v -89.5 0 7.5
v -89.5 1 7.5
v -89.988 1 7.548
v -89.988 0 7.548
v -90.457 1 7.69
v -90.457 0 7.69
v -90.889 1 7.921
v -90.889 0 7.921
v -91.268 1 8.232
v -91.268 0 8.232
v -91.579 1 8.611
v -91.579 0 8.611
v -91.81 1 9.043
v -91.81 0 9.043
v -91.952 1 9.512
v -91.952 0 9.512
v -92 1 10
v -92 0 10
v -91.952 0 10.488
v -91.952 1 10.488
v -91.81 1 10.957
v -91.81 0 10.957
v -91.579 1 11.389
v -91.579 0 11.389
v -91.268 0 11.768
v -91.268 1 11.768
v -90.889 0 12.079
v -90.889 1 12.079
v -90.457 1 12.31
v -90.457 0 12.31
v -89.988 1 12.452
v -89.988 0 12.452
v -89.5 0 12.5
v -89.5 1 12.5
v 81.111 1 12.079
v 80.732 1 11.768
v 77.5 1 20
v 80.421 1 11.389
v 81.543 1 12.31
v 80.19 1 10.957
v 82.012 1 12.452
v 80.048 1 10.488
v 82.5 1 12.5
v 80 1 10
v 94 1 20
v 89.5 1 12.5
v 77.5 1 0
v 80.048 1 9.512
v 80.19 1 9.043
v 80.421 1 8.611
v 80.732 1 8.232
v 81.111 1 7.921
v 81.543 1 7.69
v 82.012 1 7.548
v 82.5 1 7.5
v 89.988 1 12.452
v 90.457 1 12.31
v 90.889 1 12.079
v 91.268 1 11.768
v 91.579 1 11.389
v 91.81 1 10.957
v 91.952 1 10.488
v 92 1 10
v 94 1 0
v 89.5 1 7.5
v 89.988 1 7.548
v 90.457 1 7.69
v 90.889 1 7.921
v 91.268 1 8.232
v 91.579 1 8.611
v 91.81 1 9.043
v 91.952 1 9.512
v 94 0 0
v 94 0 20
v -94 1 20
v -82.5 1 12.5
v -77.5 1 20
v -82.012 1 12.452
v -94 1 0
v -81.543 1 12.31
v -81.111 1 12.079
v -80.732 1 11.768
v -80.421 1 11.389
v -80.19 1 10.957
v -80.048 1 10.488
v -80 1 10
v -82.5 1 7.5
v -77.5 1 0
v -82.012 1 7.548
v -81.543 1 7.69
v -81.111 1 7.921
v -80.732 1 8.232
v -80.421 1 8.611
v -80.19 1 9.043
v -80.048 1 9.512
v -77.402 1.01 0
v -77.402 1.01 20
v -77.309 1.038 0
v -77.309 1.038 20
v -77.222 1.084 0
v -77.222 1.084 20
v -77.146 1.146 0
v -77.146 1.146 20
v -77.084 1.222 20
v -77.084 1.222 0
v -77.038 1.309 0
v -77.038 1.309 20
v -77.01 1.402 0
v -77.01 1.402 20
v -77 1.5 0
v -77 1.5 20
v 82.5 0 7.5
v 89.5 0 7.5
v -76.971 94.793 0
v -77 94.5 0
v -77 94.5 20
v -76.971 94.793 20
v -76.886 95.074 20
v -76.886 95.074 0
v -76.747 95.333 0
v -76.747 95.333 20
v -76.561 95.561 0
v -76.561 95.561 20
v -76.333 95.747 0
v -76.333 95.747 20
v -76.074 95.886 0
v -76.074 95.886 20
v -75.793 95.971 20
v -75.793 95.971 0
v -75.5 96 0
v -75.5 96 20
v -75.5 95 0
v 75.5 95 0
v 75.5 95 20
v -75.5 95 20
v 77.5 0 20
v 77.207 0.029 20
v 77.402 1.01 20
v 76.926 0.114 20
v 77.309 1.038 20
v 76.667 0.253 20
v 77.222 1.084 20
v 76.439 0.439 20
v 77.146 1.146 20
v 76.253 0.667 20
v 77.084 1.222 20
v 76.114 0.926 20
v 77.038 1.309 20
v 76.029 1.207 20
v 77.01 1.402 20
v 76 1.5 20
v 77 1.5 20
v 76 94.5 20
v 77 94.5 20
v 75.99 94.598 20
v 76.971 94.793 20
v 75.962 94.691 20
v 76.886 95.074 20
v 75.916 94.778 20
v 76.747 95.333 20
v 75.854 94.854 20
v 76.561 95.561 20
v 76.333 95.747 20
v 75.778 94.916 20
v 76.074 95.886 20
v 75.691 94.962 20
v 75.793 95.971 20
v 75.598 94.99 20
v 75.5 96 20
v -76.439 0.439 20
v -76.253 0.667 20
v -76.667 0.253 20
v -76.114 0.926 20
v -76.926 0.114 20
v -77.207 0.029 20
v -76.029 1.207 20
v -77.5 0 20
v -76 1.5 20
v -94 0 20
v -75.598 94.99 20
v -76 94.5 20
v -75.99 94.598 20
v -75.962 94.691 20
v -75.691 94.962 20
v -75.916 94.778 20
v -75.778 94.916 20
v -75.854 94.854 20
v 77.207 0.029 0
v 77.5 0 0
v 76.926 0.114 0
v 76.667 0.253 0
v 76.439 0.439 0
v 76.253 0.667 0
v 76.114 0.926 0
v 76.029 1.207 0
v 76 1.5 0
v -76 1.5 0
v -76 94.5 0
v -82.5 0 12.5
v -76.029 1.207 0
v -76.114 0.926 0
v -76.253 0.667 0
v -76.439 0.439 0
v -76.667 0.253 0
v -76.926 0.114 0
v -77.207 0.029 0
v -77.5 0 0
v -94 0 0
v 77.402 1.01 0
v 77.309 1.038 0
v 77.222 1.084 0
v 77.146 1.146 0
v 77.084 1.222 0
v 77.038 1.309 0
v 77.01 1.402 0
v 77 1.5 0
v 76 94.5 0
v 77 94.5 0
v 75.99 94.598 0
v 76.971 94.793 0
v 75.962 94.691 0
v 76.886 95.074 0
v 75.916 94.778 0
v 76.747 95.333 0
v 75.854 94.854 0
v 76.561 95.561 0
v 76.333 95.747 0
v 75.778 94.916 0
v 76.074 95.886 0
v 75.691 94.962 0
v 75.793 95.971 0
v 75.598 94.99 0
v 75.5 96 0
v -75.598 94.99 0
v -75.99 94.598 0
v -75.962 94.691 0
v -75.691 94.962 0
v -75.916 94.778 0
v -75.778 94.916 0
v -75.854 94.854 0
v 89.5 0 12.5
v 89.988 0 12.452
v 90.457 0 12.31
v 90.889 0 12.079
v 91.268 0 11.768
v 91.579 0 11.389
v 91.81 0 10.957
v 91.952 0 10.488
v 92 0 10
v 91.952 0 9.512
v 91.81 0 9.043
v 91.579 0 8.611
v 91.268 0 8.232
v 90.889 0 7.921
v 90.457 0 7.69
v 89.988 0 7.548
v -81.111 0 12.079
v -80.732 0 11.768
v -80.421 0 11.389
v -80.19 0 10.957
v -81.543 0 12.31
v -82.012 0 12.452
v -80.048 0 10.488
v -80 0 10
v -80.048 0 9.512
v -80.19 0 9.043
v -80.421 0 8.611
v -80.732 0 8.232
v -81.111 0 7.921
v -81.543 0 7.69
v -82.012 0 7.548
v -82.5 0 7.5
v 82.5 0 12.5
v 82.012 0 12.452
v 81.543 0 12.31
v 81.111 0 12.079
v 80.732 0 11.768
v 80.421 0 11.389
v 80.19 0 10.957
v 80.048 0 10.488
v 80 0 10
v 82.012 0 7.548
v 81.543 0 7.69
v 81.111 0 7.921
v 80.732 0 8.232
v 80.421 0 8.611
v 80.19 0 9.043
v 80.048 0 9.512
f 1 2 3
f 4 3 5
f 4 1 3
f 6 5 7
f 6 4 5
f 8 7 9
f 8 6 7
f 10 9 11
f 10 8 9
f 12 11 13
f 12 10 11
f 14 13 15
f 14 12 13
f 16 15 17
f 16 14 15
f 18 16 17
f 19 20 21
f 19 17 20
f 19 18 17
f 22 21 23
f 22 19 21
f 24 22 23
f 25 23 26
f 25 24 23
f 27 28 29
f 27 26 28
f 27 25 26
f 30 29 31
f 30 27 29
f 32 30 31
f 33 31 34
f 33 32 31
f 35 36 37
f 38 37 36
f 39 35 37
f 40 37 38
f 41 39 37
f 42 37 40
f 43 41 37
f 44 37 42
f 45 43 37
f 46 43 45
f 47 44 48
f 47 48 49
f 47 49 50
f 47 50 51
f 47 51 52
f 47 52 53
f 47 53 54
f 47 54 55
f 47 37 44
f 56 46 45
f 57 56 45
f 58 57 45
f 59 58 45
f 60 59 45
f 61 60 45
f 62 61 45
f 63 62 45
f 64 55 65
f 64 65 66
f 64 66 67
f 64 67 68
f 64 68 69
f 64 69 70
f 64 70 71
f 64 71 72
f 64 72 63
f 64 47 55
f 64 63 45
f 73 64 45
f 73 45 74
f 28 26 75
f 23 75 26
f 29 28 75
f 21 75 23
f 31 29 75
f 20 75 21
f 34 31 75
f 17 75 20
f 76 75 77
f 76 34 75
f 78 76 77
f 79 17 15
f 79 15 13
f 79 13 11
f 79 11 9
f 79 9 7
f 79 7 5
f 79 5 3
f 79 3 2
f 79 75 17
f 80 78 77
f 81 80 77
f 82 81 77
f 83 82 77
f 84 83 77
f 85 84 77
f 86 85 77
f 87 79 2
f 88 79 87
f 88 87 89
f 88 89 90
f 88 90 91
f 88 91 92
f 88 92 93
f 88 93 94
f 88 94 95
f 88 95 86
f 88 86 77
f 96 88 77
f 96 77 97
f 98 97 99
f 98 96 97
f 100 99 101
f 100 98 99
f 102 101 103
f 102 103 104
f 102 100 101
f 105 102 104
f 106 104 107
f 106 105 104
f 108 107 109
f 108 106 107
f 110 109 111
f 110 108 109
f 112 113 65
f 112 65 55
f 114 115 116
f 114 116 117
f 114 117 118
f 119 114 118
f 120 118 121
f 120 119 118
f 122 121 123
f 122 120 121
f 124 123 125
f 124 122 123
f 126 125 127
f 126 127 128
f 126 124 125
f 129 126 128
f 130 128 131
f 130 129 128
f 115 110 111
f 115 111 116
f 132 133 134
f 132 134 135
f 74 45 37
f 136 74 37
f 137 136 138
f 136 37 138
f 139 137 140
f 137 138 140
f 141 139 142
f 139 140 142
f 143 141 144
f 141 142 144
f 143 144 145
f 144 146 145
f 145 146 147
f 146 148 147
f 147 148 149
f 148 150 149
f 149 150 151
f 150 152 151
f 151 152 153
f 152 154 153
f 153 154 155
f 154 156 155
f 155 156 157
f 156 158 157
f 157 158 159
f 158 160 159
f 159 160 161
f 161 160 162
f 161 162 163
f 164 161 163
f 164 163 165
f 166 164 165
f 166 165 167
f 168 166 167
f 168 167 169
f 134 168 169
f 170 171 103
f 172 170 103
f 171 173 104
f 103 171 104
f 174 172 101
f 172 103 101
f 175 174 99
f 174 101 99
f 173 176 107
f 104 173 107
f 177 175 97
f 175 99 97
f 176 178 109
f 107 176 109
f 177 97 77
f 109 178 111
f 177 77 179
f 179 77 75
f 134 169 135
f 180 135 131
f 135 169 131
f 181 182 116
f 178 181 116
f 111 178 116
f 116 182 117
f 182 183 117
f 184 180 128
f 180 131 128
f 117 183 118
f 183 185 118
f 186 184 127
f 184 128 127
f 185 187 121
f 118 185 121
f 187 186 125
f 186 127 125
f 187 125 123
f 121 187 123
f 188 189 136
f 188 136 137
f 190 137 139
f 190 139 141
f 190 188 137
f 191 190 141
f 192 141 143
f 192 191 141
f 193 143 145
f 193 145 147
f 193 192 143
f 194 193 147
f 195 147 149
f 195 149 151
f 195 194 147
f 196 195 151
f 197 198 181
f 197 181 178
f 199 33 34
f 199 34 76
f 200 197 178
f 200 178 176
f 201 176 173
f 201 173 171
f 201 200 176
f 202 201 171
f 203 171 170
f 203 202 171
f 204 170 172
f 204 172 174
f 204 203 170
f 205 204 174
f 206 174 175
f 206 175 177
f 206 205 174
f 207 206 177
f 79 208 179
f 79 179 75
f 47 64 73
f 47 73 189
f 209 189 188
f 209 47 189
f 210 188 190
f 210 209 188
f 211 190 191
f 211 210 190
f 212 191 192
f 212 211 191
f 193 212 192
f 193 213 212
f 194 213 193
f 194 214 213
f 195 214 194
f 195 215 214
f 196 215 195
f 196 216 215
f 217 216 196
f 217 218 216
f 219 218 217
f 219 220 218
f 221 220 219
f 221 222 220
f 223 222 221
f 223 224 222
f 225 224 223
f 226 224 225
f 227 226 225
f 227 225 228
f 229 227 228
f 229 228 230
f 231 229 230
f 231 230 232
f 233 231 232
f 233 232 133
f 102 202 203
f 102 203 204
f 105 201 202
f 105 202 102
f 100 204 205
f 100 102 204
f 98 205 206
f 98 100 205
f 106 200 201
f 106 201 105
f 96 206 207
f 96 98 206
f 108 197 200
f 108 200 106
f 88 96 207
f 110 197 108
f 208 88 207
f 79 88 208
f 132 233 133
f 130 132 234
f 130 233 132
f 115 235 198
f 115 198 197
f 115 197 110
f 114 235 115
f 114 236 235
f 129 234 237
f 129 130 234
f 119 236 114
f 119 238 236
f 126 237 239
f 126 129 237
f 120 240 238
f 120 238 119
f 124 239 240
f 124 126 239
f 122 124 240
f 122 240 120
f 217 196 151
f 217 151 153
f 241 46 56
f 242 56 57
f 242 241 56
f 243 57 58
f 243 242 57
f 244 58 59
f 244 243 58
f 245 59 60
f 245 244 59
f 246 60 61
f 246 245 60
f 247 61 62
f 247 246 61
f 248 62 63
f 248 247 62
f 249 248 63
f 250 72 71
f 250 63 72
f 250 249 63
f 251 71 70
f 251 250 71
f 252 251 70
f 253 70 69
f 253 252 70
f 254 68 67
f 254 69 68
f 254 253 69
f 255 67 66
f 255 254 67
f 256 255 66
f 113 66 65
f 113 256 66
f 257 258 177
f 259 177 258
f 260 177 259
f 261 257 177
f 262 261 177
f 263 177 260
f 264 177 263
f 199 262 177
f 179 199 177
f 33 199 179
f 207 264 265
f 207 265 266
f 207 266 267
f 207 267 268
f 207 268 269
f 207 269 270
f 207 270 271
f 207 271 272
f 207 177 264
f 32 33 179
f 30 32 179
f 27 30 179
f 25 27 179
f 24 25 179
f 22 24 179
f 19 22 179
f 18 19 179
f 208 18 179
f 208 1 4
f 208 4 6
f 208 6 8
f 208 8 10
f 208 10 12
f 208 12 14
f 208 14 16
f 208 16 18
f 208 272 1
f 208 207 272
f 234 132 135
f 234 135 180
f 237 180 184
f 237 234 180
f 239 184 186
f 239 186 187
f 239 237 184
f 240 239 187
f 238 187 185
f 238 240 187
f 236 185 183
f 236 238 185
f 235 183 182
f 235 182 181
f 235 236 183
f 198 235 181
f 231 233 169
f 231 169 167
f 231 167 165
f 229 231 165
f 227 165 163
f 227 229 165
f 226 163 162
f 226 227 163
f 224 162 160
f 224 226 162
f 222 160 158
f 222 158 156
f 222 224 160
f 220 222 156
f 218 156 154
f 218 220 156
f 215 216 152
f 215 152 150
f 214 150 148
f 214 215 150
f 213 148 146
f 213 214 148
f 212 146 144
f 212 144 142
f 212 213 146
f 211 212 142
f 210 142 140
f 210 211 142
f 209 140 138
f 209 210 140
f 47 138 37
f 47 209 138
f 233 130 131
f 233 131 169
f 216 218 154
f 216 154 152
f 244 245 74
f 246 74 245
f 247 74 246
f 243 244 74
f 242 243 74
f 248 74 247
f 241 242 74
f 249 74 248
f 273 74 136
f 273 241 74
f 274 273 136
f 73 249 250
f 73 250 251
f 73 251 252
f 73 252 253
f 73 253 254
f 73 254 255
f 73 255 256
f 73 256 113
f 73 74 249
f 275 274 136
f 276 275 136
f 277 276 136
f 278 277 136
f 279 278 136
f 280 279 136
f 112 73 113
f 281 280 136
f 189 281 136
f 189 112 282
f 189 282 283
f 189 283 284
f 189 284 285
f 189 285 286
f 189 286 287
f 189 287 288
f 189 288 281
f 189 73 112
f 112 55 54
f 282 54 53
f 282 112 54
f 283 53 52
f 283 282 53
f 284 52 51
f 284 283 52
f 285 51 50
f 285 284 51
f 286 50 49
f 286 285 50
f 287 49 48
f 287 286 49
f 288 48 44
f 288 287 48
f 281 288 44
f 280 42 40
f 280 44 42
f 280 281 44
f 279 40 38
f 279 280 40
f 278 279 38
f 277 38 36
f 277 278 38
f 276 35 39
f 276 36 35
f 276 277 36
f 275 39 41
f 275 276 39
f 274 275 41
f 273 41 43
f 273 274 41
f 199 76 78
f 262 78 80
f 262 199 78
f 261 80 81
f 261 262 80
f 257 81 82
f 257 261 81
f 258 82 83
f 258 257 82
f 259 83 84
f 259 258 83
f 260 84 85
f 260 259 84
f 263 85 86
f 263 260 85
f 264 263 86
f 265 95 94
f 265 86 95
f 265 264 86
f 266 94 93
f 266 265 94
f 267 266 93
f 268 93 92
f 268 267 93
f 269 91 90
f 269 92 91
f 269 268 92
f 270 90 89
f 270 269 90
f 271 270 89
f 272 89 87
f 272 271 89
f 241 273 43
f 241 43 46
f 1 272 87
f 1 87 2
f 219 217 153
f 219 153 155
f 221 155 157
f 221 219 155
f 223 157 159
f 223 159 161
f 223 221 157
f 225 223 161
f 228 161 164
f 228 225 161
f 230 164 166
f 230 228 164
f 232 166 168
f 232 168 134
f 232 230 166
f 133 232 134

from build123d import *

# Parameters (mm, degrees)
EXTRUSION1_DEPTH        = 20
ENL_V_MAT_EXTRU_1_DEPTH = 136.838138974


with BuildPart() as part:
    # Esquisse1 → Extrusion1 (new body)
    with BuildSketch(Plane.XY):
        with BuildLine():
            Line((75.5, 95), (-75.5, 95))
            ThreePointArc((-75.5, 95), (-75.853553391, 94.853553391), (-76, 94.5))
            Line((-76, 94.5), (-76, 1.5))
            ThreePointArc((-76, 1.5), (-76.439339828, 0.439339828), (-77.5, 0))
            Line((-77.5, 0), (-94, 0))
            Line((-94, 0), (-94, 1))
            Line((-94, 1), (-77.5, 1))
            ThreePointArc((-77.5, 1), (-77.146446609, 1.146446609), (-77, 1.5))
            Line((-77, 1.5), (-77, 94.5))
            ThreePointArc((-77, 94.5), (-76.560660172, 95.560660172), (-75.5, 96))
            Line((-75.5, 96), (75.5, 96))
            ThreePointArc((75.5, 96), (76.560660172, 95.560660172), (77, 94.5))
            Line((77, 94.5), (77, 1.5))
            ThreePointArc((77, 1.5), (77.146446609, 1.146446609), (77.5, 1))
            Line((77.5, 1), (94, 1))
            Line((94, 1), (94, 0))
            Line((94, 0), (77.5, 0))
            ThreePointArc((77.5, 0), (76.439339828, 0.439339828), (76, 1.5))
            Line((76, 1.5), (76, 94.5))
            ThreePointArc((76, 94.5), (75.853553391, 94.853553391), (75.5, 95))
        make_face()
    extrude(amount=EXTRUSION1_DEPTH)

    # Esquisse2 → Enlèv. mat.-Extru.1 (cut, through all)
    with BuildSketch(Plane.XZ):
        with BuildLine():
            Line((-89.5, 12.5), (-82.5, 12.5))
            ThreePointArc((-82.5, 12.5), (-80, 10), (-82.5, 7.5))
            Line((-82.5, 7.5), (-89.5, 7.5))
            ThreePointArc((-89.5, 7.5), (-92, 10), (-89.5, 12.5))
        make_face()
        with BuildLine():
            Line((89.5, 7.5), (82.5, 7.5))
            ThreePointArc((82.5, 7.5), (80, 10), (82.5, 12.5))
            Line((82.5, 12.5), (89.5, 12.5))
            ThreePointArc((89.5, 12.5), (92, 10), (89.5, 7.5))
        make_face()
    extrude(amount=-ENL_V_MAT_EXTRU_1_DEPTH, mode=Mode.SUBTRACT)


solid = part.part
